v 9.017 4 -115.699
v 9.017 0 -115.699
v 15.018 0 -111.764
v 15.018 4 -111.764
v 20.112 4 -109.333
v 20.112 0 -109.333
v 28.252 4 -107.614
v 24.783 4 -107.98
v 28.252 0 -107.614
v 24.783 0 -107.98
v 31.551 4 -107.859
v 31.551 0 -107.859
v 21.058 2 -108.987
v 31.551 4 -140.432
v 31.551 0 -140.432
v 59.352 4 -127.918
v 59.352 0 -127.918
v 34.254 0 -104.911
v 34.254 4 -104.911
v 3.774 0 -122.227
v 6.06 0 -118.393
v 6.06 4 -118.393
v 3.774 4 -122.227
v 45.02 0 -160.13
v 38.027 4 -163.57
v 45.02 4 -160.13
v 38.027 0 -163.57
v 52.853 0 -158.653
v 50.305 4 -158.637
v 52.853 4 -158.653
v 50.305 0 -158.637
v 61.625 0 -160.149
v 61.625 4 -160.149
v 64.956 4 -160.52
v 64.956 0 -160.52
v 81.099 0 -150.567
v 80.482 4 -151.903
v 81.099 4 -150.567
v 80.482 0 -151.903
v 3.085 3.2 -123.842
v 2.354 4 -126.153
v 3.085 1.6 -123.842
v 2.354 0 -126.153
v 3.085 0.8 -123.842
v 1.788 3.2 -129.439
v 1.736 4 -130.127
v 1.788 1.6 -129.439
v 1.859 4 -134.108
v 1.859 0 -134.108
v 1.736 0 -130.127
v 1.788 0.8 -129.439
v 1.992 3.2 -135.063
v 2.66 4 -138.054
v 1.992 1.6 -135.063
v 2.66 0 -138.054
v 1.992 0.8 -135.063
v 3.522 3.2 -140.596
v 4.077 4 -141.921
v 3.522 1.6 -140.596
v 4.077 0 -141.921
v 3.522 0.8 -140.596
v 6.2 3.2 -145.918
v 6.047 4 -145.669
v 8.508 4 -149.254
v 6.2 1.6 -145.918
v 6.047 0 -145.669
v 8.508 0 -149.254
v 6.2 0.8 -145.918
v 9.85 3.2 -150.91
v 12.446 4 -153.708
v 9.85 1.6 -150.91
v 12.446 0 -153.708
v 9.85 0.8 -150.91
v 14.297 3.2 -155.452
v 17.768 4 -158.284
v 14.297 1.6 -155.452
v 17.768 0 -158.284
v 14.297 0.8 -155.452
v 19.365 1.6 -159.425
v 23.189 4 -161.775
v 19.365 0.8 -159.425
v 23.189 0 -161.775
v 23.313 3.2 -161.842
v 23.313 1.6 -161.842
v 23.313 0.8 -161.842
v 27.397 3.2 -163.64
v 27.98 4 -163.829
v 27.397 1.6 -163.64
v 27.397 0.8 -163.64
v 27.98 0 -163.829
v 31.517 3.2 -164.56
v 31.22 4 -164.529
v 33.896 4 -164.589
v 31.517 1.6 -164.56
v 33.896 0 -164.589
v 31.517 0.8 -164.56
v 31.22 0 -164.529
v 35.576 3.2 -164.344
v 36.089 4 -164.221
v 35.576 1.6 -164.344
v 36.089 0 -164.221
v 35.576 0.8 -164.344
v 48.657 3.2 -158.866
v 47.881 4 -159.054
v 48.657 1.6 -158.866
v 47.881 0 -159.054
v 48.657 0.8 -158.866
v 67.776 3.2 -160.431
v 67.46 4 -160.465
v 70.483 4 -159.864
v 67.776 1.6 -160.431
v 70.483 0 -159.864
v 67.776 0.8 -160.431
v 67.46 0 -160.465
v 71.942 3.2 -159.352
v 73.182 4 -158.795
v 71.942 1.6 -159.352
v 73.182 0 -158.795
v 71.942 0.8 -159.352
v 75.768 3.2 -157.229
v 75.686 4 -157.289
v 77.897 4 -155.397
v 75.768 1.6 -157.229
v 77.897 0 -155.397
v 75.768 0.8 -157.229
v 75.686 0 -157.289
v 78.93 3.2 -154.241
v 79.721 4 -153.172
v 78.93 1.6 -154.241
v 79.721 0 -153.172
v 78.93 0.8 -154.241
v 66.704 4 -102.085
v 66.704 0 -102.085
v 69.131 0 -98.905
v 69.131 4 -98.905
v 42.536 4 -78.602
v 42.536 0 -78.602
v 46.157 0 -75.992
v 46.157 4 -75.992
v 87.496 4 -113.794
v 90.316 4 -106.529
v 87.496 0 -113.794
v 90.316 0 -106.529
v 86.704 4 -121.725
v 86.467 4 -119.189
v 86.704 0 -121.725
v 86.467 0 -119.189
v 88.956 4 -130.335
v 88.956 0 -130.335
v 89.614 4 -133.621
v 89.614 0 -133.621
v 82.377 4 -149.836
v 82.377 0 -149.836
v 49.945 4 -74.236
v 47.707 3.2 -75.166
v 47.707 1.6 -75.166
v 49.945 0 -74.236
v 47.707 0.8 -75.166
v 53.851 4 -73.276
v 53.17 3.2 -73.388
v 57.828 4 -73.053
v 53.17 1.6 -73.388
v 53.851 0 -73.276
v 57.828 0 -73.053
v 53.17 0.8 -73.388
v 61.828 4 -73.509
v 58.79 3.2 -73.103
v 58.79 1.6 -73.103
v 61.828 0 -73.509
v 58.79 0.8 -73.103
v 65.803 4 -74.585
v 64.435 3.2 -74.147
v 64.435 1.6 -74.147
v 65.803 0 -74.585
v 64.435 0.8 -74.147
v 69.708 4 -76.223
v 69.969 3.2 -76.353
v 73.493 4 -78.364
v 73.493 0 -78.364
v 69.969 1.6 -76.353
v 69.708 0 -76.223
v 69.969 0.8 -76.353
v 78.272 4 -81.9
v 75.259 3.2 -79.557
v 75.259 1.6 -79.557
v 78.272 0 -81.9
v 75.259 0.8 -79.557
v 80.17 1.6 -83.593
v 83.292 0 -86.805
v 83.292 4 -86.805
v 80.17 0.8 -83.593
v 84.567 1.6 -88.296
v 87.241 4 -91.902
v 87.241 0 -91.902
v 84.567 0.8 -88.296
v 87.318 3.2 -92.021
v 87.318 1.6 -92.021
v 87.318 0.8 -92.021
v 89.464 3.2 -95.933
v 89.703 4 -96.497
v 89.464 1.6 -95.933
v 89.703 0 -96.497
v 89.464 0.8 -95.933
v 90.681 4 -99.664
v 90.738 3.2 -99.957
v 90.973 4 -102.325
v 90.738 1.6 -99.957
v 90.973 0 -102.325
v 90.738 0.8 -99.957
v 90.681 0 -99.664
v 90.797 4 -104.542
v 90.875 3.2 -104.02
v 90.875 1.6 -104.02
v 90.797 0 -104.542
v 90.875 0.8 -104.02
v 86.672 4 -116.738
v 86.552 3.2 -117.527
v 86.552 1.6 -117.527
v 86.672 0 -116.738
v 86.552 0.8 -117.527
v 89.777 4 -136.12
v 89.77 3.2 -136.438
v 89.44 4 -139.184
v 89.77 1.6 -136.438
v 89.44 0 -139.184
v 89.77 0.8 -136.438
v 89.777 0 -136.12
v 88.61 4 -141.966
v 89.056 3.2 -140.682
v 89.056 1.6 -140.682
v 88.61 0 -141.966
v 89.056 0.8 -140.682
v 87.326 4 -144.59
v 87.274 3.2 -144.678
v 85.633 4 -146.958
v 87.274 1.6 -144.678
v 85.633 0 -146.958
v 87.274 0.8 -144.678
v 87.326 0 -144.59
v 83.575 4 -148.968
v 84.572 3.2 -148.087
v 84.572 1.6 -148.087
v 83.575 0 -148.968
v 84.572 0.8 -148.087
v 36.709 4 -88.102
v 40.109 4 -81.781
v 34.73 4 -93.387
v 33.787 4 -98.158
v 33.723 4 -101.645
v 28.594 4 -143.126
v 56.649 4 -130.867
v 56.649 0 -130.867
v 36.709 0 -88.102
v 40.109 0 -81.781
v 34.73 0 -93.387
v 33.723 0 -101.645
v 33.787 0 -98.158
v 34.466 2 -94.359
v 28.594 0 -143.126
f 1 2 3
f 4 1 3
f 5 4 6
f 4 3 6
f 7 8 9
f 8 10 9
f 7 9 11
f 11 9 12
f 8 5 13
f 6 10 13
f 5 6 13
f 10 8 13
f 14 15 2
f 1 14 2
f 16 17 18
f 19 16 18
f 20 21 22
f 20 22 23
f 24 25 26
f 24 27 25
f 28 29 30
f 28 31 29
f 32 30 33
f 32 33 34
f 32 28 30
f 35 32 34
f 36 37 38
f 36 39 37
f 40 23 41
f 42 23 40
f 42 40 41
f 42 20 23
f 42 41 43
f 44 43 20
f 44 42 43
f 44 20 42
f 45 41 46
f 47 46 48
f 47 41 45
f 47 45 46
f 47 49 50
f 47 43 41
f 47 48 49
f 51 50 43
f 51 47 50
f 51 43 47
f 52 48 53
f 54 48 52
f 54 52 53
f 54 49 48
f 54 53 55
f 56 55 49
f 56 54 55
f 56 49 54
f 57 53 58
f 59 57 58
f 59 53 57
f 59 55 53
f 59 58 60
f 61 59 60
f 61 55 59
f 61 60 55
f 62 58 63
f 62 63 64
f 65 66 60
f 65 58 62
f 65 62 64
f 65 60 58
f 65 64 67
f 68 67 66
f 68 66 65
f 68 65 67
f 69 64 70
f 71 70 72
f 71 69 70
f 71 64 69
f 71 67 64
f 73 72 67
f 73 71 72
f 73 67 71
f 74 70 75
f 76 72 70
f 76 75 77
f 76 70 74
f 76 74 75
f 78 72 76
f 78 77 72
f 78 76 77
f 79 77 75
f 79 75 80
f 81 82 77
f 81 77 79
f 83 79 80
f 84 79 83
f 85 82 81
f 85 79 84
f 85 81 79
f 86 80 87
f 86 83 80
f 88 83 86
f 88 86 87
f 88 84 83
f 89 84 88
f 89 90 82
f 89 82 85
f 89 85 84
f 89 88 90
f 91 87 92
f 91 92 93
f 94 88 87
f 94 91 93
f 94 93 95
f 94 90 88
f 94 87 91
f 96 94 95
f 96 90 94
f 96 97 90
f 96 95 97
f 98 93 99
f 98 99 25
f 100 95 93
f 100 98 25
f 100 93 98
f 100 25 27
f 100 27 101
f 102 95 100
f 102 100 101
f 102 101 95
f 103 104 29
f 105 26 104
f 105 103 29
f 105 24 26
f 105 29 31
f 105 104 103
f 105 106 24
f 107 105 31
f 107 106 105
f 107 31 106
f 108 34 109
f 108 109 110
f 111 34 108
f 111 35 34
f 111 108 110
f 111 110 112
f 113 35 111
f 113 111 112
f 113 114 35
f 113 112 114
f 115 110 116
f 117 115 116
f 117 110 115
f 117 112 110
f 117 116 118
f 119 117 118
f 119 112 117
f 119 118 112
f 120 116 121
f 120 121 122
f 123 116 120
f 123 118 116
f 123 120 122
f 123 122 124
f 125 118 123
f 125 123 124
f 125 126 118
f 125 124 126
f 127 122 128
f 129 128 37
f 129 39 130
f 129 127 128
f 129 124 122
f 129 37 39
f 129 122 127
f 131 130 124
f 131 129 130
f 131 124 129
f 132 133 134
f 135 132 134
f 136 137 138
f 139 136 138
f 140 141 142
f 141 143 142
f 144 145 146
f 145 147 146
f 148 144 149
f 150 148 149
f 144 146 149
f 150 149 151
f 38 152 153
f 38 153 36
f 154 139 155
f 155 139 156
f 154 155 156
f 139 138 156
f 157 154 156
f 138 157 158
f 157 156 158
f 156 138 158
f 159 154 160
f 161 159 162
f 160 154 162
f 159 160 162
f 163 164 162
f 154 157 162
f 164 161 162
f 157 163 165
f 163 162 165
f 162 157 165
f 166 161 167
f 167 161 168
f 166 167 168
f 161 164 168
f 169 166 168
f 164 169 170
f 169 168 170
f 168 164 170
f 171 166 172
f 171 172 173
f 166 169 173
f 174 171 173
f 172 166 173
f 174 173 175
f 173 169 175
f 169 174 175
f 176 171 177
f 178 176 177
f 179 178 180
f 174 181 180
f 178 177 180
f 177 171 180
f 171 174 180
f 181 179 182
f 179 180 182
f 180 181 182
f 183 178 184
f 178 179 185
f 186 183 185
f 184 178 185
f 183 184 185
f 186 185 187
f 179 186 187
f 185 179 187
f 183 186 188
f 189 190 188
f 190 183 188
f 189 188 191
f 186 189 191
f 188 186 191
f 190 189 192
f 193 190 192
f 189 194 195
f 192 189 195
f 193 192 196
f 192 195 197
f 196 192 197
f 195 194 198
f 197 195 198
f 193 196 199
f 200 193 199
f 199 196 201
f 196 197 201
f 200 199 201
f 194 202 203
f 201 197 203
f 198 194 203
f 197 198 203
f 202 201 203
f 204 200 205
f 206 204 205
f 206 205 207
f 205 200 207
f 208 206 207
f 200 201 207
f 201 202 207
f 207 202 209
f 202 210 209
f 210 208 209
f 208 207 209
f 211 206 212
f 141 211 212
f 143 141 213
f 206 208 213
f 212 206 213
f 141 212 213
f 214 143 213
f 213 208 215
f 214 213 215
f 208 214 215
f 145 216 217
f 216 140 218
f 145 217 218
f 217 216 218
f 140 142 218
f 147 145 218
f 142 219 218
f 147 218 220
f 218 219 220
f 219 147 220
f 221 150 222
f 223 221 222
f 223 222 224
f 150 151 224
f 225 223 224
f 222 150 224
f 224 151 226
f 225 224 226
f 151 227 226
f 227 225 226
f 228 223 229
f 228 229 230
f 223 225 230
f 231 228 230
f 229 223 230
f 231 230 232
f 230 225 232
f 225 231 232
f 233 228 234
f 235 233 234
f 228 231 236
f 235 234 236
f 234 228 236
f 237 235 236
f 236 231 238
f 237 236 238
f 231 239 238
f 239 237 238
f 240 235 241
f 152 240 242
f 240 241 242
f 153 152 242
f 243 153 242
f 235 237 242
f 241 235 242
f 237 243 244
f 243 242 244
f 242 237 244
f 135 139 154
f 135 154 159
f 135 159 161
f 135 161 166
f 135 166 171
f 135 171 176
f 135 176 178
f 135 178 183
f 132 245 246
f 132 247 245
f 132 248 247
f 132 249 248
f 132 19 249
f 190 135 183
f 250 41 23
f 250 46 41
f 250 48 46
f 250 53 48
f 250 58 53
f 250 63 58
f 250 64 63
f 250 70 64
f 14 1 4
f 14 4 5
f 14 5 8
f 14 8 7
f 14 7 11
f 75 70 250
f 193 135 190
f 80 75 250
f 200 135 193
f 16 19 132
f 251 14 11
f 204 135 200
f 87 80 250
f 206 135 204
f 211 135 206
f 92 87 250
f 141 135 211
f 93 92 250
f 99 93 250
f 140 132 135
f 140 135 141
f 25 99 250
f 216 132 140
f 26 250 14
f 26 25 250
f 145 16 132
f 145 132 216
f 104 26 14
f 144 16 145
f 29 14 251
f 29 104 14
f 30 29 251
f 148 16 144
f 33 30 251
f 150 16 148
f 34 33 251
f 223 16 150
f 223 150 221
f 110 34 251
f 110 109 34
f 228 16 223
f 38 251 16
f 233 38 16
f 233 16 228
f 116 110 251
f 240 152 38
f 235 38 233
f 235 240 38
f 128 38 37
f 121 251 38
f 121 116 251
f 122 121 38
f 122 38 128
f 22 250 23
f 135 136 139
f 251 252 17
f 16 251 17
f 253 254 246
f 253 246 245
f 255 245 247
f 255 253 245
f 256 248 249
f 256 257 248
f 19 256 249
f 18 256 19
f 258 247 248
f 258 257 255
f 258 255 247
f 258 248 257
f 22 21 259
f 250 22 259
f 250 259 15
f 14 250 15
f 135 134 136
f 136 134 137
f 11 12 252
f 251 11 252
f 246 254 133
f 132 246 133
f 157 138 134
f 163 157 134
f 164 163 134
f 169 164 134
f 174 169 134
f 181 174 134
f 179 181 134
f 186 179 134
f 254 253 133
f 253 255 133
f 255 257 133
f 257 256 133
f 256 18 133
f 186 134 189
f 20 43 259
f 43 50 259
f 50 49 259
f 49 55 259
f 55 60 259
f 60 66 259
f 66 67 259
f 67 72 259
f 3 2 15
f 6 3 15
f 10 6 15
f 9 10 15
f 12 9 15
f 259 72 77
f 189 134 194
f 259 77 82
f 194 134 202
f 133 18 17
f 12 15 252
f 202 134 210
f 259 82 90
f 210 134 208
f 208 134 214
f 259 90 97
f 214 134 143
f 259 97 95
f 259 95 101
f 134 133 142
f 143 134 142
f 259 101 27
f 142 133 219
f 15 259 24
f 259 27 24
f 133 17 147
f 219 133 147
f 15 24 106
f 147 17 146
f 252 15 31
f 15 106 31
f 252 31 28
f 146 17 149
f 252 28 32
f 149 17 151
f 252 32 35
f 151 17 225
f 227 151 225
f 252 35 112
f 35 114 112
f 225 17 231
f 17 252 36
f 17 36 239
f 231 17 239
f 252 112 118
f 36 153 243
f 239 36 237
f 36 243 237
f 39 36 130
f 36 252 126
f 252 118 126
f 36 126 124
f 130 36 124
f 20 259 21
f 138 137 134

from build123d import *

# Parameters (mm, degrees)
EXTRUDE_1_DEPTH = 4


with BuildPart() as part:
    # Эскиз1 → Бобышка-Вытянуть1 (new body)
    with BuildSketch(Plane(origin=(0, 0, 0), x_dir=(1, 0, 0), z_dir=(0, 1, 0))):
        with BuildLine():
            Line((6.059908157, 118.392686307), (28.593973382, 143.125900973))
            Line((28.593973382, 143.125900973), (31.550796909, 140.431982892))
            Line((31.550796909, 140.431982892), (9.016731683, 115.698768225))
            add(Edge.make_bspline(
                [(9.016731683, 115.698768225), (21.831674205, 106.194204472), (31.550796909, 107.859296928)],
                knots=[0, 0, 0, 1, 1, 1], degree=2))
            Line((31.550796909, 107.859296928), (56.649035515, 130.866687174))
            Line((56.649035515, 130.866687174), (59.351976898, 127.918109911))
            Line((59.351976898, 127.918109911), (34.253738292, 104.910719665))
            add(Edge.make_bspline(
                [(40.108512431, 81.781451939), (31.751660046, 95.372717596), (34.253738292, 104.910719665)],
                knots=[0, 0, 0, 1, 1, 1], degree=2))
            Line((40.108512431, 81.781451939), (66.703590649, 102.084599918))
            Line((66.703590649, 102.084599918), (69.130805487, 98.905193034))
            Line((69.130805487, 98.905193034), (42.535727268, 78.602045055))
            add(Edge.make_bspline(
                [(42.535727268, 78.602045055), (55.815710688, 67.080310927), (80.094766474, 77.881516918), (94.120739474, 103.222216708), (82.757628545, 119.035683166), (93.554720003, 135.259749049), (86.176436575, 148.029815365), (81.0994368, 150.567036284)],
                knots=[0, 0, 0, 0, 0.411773236, 0.560770406, 0.685497453, 0.854203012, 1, 1, 1, 1], degree=3))
            add(Edge.make_bspline(
                [(6.059908157, 118.392686307), (-4.266159161, 132.622255896), (8.600850307, 155.872603594), (35.062931054, 167.647036362), (49.830860852, 154.954744966), (66.930538064, 164.303463432), (79.012282091, 155.845028509), (81.0994368, 150.567036284)],
                knots=[0, 0, 0, 0, 0.411773236, 0.560770406, 0.685497453, 0.854203012, 1, 1, 1, 1], degree=3))
        make_face()
    extrude(amount=EXTRUDE_1_DEPTH)


solid = part.part
